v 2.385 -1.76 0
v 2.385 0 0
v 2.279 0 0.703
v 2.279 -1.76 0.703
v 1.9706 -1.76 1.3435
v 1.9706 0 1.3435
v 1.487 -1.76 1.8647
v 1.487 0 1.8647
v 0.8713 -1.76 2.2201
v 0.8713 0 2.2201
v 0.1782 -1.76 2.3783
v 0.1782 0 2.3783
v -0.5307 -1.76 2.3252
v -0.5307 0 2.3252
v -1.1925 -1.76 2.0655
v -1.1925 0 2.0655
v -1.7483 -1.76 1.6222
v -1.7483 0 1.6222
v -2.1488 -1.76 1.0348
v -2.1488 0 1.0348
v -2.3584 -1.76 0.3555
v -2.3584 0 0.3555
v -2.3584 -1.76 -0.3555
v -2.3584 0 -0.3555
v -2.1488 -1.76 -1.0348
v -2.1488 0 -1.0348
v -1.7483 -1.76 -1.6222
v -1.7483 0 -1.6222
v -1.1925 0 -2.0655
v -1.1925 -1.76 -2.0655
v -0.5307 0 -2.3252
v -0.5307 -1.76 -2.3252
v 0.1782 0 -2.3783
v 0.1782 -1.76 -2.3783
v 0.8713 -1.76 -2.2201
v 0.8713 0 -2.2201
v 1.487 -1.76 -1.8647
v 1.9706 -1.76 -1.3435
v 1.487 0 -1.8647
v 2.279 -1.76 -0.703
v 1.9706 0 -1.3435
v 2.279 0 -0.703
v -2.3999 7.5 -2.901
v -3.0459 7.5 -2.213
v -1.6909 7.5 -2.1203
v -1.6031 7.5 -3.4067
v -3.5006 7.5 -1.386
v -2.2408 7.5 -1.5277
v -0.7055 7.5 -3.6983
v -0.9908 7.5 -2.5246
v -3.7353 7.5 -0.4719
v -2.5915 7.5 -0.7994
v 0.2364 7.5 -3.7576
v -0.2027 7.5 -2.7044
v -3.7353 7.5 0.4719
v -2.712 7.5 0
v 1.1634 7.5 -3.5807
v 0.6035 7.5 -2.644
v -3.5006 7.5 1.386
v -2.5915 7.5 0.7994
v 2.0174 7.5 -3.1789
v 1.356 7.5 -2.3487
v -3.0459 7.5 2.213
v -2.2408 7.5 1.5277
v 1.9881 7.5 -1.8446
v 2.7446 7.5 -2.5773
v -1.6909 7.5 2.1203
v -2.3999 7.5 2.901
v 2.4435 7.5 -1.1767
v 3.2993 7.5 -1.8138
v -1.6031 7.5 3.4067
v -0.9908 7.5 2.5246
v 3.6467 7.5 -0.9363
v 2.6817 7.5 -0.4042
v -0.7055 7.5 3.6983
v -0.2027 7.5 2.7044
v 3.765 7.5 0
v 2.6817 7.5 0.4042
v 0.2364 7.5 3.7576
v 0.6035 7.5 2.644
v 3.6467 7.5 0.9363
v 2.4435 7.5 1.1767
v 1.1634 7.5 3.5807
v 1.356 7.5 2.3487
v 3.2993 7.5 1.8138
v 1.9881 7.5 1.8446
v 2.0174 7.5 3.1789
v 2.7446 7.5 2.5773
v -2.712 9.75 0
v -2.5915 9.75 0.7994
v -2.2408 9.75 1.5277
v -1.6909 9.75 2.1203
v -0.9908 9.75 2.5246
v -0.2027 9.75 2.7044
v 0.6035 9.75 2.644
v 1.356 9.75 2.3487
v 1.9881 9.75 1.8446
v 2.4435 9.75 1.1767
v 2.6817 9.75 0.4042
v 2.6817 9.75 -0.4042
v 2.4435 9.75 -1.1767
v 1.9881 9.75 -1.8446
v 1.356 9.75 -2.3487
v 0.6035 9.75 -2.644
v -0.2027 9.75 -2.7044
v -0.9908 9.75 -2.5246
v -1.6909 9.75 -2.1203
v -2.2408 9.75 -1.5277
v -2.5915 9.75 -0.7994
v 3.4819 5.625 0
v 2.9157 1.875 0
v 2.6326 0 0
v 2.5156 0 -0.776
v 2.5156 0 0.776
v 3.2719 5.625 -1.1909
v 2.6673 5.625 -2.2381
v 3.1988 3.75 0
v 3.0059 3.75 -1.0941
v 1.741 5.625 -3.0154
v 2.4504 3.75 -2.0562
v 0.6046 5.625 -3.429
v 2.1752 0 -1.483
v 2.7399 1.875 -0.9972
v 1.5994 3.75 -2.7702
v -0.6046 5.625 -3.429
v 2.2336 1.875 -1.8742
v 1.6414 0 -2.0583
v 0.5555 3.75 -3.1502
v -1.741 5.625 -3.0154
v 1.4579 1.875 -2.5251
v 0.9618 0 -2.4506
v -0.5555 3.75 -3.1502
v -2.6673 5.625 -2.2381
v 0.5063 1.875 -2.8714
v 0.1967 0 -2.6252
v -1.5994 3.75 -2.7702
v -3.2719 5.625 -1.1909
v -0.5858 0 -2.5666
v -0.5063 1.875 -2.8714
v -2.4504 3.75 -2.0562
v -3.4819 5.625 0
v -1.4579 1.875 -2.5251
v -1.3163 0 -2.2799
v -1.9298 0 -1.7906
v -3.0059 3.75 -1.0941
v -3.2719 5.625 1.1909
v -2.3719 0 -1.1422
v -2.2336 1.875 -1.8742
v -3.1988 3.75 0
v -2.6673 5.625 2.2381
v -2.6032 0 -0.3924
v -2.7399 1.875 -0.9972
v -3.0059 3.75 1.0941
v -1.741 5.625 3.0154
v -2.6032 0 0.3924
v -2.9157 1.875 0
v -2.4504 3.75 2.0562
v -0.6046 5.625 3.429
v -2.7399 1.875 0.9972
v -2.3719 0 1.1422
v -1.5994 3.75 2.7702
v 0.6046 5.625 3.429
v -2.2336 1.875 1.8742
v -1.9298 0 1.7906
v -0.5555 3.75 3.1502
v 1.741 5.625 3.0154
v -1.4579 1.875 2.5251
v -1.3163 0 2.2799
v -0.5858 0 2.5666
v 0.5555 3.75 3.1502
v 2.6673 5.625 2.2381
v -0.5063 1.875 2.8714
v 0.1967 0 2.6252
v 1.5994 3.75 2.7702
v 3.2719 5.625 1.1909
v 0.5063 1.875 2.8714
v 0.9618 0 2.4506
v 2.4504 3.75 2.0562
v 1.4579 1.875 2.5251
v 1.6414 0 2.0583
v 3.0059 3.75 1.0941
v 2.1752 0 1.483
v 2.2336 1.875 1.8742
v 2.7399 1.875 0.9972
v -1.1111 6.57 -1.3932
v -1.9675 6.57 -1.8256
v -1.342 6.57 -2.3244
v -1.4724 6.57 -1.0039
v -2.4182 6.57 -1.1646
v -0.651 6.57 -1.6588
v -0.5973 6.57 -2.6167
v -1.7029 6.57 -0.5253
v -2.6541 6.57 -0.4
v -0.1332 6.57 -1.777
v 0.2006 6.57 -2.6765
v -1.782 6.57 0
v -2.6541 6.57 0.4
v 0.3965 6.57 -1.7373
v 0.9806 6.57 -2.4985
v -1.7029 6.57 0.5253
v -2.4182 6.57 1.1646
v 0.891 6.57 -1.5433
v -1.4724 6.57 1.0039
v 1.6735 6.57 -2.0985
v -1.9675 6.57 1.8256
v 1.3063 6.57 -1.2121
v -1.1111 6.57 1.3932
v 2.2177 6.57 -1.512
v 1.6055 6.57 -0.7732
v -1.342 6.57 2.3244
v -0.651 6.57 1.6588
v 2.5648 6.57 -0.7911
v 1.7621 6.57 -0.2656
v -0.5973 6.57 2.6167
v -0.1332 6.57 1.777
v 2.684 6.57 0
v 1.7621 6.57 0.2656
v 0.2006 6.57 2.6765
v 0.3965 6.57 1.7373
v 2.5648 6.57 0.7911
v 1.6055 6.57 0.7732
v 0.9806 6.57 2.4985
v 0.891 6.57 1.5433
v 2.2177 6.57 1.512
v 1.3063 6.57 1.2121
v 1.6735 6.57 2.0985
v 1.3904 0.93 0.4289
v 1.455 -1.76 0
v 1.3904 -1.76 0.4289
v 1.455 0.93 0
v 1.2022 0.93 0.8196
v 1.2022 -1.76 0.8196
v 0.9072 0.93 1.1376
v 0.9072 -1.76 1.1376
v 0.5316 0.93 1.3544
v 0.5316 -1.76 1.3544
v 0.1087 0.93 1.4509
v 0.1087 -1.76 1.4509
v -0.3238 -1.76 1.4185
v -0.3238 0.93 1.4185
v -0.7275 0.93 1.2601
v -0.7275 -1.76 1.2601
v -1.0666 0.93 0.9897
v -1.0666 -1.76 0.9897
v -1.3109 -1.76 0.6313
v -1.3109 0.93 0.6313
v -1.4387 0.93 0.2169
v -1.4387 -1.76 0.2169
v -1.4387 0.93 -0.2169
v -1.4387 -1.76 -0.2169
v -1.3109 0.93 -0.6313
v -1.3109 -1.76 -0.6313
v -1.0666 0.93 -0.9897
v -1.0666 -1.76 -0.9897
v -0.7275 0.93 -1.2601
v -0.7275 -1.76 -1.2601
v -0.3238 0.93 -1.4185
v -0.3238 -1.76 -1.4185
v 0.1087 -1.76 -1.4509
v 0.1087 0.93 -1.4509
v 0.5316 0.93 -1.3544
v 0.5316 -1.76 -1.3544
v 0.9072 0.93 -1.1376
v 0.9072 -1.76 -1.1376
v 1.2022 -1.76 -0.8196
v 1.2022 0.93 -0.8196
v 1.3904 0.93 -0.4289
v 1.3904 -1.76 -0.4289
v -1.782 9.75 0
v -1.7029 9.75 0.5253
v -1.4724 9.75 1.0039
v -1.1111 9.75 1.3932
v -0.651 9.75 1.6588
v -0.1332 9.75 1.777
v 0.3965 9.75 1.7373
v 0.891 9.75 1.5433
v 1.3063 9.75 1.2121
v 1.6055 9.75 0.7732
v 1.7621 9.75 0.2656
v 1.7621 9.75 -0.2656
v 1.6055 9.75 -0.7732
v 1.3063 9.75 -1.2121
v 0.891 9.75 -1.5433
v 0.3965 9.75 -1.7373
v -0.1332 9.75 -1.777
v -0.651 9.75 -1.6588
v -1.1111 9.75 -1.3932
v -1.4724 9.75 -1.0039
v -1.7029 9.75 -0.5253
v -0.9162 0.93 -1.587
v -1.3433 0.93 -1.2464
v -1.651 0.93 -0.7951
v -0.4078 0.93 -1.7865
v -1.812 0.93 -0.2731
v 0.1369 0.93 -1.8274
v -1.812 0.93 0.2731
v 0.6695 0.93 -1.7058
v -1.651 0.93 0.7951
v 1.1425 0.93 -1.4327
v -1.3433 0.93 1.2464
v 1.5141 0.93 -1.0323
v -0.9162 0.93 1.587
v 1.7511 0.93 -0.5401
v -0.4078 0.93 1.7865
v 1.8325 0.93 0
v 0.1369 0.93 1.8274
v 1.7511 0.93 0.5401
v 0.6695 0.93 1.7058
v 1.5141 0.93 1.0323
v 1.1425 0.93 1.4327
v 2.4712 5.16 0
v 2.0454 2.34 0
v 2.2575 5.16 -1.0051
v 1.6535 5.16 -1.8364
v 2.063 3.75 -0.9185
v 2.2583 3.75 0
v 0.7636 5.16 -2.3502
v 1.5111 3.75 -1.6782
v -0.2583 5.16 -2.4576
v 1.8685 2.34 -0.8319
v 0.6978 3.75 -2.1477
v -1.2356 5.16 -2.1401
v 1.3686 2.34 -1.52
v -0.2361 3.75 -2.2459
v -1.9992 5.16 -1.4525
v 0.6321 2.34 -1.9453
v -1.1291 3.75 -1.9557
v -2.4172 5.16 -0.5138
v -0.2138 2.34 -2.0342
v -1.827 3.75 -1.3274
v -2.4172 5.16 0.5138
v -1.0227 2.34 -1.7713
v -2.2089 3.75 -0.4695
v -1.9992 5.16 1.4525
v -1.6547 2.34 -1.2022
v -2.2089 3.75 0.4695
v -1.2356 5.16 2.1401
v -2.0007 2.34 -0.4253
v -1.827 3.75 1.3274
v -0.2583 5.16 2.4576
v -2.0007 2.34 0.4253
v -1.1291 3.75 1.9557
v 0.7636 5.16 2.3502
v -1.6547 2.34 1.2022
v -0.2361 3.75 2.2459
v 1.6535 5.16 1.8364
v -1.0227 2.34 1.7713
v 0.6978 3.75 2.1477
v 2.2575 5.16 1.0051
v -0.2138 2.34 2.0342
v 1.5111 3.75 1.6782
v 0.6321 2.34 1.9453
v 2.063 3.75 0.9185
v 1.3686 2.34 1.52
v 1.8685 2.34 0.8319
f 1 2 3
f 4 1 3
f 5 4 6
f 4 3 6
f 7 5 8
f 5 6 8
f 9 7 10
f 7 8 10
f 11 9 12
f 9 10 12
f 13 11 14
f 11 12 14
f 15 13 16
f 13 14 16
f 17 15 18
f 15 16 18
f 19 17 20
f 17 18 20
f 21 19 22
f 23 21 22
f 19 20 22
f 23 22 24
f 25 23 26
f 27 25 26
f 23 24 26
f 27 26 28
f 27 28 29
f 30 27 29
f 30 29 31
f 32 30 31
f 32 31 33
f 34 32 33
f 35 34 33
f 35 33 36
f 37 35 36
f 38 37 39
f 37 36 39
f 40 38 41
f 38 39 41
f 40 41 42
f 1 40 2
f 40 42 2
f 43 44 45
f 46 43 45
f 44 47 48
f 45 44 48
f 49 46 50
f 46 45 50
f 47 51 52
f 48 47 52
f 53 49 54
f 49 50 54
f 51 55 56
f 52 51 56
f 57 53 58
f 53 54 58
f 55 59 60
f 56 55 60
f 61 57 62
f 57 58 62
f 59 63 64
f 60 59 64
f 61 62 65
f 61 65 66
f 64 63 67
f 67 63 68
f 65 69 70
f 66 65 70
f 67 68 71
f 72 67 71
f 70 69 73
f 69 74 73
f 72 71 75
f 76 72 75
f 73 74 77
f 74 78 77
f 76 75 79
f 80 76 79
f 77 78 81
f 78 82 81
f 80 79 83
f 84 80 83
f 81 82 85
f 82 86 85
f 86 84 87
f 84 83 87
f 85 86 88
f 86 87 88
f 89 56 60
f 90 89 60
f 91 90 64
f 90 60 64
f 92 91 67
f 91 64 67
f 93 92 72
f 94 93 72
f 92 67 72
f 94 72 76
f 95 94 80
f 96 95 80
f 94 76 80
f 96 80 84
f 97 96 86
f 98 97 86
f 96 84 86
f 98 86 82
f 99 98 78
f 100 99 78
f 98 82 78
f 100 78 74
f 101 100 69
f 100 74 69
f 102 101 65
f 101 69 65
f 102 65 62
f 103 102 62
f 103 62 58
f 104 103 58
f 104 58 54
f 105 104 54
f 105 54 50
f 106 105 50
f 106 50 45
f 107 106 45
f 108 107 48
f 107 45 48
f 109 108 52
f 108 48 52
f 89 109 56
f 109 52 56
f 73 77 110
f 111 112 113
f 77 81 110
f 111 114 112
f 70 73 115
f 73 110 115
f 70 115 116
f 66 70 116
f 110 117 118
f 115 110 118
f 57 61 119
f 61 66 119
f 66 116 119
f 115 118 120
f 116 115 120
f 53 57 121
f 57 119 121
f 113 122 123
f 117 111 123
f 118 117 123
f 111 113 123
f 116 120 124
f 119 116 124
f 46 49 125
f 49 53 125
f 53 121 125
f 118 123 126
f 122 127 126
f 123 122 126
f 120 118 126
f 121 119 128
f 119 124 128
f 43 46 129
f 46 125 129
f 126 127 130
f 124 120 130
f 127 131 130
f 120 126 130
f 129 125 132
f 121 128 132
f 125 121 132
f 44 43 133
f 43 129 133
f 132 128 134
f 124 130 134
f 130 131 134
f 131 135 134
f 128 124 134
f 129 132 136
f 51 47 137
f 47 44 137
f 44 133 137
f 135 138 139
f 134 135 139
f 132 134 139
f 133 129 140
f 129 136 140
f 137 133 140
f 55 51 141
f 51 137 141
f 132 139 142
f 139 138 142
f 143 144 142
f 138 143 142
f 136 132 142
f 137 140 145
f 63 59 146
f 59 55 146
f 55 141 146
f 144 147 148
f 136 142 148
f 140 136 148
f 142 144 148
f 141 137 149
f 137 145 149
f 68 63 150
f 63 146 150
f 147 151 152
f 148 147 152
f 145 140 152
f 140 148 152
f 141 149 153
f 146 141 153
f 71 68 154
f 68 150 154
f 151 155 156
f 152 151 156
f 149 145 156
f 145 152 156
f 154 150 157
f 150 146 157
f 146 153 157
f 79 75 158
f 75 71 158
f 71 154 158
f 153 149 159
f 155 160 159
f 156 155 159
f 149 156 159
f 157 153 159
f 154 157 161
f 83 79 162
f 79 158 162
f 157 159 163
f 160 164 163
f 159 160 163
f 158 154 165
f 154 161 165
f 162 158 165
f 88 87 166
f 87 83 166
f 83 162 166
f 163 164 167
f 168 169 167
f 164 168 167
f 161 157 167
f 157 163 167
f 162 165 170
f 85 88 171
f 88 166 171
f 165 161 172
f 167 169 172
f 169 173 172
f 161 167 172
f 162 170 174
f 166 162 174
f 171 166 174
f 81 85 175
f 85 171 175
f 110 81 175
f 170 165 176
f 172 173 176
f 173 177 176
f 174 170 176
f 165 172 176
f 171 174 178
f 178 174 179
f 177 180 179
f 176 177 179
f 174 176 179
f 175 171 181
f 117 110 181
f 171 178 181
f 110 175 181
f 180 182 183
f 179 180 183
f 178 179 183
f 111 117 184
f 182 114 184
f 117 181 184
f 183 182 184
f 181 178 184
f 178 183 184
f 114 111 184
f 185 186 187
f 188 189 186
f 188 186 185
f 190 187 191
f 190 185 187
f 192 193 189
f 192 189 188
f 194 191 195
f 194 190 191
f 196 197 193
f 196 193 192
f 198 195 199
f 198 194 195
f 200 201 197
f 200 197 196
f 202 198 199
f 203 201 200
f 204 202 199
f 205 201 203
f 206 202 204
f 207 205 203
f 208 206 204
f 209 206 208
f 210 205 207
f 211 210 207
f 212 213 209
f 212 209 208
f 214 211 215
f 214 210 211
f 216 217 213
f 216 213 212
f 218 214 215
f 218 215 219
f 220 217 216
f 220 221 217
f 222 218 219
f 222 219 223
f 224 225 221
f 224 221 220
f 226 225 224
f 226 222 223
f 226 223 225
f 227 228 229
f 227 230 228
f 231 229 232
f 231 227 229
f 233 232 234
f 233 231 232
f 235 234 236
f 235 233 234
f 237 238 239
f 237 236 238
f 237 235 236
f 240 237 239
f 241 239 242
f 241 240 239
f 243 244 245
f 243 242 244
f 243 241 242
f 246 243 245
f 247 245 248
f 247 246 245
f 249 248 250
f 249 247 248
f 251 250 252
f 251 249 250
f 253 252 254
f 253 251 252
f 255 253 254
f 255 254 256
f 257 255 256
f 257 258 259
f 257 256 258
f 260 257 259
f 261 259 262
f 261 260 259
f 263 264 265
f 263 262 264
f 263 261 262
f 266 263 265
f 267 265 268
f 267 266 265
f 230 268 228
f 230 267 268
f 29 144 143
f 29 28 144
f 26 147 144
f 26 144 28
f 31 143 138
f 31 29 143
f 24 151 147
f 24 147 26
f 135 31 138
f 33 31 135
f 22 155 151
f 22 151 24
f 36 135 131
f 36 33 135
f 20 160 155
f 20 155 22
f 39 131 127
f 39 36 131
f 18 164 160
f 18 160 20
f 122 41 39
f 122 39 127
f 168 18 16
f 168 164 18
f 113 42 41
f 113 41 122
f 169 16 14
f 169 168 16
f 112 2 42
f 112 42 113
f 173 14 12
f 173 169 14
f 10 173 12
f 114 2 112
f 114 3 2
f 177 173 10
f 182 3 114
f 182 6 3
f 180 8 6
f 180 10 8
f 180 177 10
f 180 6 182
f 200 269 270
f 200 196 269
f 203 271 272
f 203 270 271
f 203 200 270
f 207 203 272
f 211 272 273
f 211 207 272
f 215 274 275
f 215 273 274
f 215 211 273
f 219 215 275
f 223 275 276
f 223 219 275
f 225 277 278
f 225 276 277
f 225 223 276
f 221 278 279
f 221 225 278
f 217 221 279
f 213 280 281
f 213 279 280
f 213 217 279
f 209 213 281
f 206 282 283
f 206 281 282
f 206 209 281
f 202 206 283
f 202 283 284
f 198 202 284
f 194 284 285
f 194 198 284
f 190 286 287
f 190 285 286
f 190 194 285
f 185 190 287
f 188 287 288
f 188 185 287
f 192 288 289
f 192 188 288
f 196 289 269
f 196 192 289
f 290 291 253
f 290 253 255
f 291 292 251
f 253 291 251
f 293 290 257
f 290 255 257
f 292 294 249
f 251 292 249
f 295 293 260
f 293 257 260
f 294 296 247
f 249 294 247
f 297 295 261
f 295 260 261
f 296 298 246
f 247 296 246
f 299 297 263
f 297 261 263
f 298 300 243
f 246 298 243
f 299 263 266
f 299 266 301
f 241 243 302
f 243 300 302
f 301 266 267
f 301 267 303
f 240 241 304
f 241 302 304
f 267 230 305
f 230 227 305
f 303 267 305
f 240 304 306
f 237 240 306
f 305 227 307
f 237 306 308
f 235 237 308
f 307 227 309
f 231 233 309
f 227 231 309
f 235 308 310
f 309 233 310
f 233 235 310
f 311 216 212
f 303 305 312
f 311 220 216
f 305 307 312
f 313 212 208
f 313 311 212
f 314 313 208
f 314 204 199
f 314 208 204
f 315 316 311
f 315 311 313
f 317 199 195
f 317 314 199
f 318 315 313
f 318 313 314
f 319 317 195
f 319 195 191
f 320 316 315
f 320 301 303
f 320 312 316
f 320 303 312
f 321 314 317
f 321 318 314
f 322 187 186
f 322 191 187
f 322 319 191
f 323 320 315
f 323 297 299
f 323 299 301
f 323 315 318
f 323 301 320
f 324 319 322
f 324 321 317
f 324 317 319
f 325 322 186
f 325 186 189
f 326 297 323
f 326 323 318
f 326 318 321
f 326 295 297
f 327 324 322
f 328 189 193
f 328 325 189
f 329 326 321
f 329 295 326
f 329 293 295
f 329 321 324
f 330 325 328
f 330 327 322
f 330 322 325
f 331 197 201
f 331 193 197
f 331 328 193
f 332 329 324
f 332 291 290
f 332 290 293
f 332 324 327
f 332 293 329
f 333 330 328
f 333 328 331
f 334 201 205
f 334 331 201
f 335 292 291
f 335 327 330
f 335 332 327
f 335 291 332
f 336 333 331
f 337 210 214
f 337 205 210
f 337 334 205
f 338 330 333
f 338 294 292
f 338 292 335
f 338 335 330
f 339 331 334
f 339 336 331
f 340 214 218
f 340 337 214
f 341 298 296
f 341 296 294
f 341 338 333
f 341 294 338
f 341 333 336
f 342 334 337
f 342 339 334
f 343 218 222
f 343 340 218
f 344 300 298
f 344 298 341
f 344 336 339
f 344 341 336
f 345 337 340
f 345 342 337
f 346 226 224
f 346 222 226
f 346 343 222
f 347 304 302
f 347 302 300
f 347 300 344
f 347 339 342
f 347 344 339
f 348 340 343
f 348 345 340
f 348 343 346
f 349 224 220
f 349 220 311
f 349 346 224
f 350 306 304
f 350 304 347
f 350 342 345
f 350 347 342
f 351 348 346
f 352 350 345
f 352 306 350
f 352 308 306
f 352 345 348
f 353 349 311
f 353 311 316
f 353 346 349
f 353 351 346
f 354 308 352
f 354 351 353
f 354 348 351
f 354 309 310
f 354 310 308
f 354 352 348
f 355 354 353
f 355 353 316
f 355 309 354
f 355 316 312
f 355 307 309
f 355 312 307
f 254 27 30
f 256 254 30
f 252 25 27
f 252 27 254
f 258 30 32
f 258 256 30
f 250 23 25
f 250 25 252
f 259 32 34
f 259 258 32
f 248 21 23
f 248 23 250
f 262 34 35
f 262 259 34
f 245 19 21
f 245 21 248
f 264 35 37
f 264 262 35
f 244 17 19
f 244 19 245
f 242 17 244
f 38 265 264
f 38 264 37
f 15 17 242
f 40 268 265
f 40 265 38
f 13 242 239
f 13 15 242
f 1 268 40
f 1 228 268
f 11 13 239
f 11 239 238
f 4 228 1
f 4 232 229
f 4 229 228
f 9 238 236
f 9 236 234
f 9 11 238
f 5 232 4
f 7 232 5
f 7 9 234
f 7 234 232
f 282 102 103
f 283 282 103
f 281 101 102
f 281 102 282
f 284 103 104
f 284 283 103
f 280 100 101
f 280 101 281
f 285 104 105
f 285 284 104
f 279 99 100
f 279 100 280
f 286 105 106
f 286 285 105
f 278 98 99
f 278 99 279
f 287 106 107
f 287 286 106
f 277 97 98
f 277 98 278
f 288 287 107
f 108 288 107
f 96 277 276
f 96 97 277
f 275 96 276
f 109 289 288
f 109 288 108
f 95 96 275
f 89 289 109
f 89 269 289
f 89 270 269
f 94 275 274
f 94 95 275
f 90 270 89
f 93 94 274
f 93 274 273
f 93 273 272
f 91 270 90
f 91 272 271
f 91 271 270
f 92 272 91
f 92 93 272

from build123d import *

# Parameters (mm, degrees)
F0_R       = 3.765
F1_DEPTH   = 7.5
F1_FACE1_R = 3.765
F2_R       = 2.6326071787
F4_R       = 2.385
F5_DEPTH   = 1.76
F6_R       = 2.7120257238
F7_DEPTH   = 2.25
F8_T       = -0.93


with BuildPart() as f1:
    # F0 (on Front) → F1 (new body)
    with BuildSketch(Plane.XZ):
        Circle(F0_R)
    extrude(amount=-F1_DEPTH)

    # F1_face1 (on face) → F3 section 0
    with BuildSketch(Plane(origin=(0, 7.5, 0), x_dir=(1, 0, 0), z_dir=(0, 1, 0))):
        Circle(F1_FACE1_R)
    # F2 (on face) → F3 section 1
    with BuildSketch(Plane.XZ):
        Circle(F2_R)
    loft(mode=Mode.INTERSECT)

    # F4 (on Front) → F5 (join)
    with BuildSketch(Plane.XZ):
        Circle(F4_R)
    extrude(amount=F5_DEPTH)

    # F6 (on face) → F7 (join)
    with BuildSketch(Plane(origin=(0, 7.5, 0), x_dir=(-1, 0, 0), z_dir=(0, 1, 0))):
        Circle(F6_R)
    extrude(amount=F7_DEPTH)

    # F8
    f8_openings = [f1.faces().sort_by_distance(p)[0] for p in [
        (0, -1.76, 0),
        (0, 9.75, 0),
    ]]
    offset(amount=F8_T, openings=f8_openings, kind=Kind.INTERSECTION)


solid = f1.part
